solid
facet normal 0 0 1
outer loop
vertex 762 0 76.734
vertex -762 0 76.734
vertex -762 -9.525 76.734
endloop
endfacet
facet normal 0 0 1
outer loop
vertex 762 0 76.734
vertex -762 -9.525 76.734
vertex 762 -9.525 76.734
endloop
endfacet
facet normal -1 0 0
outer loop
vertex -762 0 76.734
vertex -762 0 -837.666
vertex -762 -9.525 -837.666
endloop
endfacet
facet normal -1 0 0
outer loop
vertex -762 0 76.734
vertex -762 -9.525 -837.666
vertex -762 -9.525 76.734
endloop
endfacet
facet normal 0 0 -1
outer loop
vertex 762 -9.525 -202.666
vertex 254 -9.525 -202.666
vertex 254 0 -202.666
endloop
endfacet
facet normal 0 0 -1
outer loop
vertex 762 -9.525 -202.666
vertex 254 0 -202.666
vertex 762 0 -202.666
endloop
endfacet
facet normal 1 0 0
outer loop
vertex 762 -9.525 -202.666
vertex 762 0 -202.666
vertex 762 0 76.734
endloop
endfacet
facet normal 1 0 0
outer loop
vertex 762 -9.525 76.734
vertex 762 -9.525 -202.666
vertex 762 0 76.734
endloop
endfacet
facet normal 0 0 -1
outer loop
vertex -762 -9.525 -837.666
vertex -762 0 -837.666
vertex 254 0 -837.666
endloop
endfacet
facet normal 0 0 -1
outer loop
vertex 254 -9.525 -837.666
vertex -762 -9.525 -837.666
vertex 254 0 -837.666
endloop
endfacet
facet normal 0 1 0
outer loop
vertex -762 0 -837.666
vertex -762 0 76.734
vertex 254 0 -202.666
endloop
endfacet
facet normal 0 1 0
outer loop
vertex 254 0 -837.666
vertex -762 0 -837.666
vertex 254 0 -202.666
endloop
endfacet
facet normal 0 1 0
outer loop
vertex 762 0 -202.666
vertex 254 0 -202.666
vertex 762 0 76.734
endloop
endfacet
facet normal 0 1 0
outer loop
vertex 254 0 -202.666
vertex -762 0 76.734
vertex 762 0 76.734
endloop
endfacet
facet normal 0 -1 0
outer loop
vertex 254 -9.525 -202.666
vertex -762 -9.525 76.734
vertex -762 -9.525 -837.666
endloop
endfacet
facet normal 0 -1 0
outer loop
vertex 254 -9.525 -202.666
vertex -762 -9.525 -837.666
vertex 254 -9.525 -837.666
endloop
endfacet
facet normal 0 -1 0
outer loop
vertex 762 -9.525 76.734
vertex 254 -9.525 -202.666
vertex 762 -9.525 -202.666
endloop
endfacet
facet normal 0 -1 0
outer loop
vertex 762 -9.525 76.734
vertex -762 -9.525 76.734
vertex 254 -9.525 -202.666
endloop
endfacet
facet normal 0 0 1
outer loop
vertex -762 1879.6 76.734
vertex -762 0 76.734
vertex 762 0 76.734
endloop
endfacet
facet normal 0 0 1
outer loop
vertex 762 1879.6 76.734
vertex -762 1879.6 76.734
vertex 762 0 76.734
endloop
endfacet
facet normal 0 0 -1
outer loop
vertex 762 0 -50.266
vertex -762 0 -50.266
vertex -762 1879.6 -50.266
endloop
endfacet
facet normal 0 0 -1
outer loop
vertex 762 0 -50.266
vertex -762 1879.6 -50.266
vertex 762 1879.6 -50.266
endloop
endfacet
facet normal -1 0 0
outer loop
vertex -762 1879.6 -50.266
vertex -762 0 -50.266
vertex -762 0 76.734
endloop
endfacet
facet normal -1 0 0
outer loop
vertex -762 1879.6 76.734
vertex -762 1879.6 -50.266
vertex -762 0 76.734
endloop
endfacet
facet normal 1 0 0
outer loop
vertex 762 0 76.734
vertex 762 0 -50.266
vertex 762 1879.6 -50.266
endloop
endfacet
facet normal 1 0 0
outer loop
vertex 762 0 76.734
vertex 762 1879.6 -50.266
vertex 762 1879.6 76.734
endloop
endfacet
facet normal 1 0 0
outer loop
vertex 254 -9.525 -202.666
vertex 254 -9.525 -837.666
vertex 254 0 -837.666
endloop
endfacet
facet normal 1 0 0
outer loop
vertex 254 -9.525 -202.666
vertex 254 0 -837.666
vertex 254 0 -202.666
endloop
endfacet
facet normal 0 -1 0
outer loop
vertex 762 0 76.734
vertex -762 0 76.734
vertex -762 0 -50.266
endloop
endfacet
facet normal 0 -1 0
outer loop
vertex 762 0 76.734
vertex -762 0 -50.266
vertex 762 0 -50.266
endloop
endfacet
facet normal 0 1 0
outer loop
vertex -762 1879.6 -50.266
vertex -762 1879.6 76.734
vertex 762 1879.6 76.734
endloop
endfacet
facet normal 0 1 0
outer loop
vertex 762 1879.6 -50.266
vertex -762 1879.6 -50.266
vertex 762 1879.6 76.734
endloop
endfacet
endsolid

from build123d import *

# Parameters (mm, degrees)
F0_W     = 1524
F0_H     = 127
F1_DEPTH = 1879.6
F2_W     = 1524
F2_H     = 914.4
F3_DEPTH = 9.525
F4_W     = 508
F4_H     = 635
F5_DEPTH = 19.05


with BuildPart() as f1:
    # F0 (on Front) → F1 (new body)
    with BuildSketch(Plane.XZ):
        with Locations((0, 13.233984)):
            Rectangle(F0_W, F0_H)
    extrude(amount=-F1_DEPTH)


with BuildPart() as f3:
    # F2 (on face) → F3 (new body)
    with BuildSketch(Plane.XZ):
        with Locations((0, -380.466016)):
            Rectangle(F2_W, F2_H)
    extrude(amount=F3_DEPTH)

    # F4 (on face) → F5 (cut)
    with BuildSketch(Plane.XZ.offset(9.525)):
        with Locations((508, -520.166016)):
            Rectangle(F4_W, F4_H)
    extrude(amount=-F5_DEPTH, mode=Mode.SUBTRACT)


solid = Compound([f1.part, f3.part])
